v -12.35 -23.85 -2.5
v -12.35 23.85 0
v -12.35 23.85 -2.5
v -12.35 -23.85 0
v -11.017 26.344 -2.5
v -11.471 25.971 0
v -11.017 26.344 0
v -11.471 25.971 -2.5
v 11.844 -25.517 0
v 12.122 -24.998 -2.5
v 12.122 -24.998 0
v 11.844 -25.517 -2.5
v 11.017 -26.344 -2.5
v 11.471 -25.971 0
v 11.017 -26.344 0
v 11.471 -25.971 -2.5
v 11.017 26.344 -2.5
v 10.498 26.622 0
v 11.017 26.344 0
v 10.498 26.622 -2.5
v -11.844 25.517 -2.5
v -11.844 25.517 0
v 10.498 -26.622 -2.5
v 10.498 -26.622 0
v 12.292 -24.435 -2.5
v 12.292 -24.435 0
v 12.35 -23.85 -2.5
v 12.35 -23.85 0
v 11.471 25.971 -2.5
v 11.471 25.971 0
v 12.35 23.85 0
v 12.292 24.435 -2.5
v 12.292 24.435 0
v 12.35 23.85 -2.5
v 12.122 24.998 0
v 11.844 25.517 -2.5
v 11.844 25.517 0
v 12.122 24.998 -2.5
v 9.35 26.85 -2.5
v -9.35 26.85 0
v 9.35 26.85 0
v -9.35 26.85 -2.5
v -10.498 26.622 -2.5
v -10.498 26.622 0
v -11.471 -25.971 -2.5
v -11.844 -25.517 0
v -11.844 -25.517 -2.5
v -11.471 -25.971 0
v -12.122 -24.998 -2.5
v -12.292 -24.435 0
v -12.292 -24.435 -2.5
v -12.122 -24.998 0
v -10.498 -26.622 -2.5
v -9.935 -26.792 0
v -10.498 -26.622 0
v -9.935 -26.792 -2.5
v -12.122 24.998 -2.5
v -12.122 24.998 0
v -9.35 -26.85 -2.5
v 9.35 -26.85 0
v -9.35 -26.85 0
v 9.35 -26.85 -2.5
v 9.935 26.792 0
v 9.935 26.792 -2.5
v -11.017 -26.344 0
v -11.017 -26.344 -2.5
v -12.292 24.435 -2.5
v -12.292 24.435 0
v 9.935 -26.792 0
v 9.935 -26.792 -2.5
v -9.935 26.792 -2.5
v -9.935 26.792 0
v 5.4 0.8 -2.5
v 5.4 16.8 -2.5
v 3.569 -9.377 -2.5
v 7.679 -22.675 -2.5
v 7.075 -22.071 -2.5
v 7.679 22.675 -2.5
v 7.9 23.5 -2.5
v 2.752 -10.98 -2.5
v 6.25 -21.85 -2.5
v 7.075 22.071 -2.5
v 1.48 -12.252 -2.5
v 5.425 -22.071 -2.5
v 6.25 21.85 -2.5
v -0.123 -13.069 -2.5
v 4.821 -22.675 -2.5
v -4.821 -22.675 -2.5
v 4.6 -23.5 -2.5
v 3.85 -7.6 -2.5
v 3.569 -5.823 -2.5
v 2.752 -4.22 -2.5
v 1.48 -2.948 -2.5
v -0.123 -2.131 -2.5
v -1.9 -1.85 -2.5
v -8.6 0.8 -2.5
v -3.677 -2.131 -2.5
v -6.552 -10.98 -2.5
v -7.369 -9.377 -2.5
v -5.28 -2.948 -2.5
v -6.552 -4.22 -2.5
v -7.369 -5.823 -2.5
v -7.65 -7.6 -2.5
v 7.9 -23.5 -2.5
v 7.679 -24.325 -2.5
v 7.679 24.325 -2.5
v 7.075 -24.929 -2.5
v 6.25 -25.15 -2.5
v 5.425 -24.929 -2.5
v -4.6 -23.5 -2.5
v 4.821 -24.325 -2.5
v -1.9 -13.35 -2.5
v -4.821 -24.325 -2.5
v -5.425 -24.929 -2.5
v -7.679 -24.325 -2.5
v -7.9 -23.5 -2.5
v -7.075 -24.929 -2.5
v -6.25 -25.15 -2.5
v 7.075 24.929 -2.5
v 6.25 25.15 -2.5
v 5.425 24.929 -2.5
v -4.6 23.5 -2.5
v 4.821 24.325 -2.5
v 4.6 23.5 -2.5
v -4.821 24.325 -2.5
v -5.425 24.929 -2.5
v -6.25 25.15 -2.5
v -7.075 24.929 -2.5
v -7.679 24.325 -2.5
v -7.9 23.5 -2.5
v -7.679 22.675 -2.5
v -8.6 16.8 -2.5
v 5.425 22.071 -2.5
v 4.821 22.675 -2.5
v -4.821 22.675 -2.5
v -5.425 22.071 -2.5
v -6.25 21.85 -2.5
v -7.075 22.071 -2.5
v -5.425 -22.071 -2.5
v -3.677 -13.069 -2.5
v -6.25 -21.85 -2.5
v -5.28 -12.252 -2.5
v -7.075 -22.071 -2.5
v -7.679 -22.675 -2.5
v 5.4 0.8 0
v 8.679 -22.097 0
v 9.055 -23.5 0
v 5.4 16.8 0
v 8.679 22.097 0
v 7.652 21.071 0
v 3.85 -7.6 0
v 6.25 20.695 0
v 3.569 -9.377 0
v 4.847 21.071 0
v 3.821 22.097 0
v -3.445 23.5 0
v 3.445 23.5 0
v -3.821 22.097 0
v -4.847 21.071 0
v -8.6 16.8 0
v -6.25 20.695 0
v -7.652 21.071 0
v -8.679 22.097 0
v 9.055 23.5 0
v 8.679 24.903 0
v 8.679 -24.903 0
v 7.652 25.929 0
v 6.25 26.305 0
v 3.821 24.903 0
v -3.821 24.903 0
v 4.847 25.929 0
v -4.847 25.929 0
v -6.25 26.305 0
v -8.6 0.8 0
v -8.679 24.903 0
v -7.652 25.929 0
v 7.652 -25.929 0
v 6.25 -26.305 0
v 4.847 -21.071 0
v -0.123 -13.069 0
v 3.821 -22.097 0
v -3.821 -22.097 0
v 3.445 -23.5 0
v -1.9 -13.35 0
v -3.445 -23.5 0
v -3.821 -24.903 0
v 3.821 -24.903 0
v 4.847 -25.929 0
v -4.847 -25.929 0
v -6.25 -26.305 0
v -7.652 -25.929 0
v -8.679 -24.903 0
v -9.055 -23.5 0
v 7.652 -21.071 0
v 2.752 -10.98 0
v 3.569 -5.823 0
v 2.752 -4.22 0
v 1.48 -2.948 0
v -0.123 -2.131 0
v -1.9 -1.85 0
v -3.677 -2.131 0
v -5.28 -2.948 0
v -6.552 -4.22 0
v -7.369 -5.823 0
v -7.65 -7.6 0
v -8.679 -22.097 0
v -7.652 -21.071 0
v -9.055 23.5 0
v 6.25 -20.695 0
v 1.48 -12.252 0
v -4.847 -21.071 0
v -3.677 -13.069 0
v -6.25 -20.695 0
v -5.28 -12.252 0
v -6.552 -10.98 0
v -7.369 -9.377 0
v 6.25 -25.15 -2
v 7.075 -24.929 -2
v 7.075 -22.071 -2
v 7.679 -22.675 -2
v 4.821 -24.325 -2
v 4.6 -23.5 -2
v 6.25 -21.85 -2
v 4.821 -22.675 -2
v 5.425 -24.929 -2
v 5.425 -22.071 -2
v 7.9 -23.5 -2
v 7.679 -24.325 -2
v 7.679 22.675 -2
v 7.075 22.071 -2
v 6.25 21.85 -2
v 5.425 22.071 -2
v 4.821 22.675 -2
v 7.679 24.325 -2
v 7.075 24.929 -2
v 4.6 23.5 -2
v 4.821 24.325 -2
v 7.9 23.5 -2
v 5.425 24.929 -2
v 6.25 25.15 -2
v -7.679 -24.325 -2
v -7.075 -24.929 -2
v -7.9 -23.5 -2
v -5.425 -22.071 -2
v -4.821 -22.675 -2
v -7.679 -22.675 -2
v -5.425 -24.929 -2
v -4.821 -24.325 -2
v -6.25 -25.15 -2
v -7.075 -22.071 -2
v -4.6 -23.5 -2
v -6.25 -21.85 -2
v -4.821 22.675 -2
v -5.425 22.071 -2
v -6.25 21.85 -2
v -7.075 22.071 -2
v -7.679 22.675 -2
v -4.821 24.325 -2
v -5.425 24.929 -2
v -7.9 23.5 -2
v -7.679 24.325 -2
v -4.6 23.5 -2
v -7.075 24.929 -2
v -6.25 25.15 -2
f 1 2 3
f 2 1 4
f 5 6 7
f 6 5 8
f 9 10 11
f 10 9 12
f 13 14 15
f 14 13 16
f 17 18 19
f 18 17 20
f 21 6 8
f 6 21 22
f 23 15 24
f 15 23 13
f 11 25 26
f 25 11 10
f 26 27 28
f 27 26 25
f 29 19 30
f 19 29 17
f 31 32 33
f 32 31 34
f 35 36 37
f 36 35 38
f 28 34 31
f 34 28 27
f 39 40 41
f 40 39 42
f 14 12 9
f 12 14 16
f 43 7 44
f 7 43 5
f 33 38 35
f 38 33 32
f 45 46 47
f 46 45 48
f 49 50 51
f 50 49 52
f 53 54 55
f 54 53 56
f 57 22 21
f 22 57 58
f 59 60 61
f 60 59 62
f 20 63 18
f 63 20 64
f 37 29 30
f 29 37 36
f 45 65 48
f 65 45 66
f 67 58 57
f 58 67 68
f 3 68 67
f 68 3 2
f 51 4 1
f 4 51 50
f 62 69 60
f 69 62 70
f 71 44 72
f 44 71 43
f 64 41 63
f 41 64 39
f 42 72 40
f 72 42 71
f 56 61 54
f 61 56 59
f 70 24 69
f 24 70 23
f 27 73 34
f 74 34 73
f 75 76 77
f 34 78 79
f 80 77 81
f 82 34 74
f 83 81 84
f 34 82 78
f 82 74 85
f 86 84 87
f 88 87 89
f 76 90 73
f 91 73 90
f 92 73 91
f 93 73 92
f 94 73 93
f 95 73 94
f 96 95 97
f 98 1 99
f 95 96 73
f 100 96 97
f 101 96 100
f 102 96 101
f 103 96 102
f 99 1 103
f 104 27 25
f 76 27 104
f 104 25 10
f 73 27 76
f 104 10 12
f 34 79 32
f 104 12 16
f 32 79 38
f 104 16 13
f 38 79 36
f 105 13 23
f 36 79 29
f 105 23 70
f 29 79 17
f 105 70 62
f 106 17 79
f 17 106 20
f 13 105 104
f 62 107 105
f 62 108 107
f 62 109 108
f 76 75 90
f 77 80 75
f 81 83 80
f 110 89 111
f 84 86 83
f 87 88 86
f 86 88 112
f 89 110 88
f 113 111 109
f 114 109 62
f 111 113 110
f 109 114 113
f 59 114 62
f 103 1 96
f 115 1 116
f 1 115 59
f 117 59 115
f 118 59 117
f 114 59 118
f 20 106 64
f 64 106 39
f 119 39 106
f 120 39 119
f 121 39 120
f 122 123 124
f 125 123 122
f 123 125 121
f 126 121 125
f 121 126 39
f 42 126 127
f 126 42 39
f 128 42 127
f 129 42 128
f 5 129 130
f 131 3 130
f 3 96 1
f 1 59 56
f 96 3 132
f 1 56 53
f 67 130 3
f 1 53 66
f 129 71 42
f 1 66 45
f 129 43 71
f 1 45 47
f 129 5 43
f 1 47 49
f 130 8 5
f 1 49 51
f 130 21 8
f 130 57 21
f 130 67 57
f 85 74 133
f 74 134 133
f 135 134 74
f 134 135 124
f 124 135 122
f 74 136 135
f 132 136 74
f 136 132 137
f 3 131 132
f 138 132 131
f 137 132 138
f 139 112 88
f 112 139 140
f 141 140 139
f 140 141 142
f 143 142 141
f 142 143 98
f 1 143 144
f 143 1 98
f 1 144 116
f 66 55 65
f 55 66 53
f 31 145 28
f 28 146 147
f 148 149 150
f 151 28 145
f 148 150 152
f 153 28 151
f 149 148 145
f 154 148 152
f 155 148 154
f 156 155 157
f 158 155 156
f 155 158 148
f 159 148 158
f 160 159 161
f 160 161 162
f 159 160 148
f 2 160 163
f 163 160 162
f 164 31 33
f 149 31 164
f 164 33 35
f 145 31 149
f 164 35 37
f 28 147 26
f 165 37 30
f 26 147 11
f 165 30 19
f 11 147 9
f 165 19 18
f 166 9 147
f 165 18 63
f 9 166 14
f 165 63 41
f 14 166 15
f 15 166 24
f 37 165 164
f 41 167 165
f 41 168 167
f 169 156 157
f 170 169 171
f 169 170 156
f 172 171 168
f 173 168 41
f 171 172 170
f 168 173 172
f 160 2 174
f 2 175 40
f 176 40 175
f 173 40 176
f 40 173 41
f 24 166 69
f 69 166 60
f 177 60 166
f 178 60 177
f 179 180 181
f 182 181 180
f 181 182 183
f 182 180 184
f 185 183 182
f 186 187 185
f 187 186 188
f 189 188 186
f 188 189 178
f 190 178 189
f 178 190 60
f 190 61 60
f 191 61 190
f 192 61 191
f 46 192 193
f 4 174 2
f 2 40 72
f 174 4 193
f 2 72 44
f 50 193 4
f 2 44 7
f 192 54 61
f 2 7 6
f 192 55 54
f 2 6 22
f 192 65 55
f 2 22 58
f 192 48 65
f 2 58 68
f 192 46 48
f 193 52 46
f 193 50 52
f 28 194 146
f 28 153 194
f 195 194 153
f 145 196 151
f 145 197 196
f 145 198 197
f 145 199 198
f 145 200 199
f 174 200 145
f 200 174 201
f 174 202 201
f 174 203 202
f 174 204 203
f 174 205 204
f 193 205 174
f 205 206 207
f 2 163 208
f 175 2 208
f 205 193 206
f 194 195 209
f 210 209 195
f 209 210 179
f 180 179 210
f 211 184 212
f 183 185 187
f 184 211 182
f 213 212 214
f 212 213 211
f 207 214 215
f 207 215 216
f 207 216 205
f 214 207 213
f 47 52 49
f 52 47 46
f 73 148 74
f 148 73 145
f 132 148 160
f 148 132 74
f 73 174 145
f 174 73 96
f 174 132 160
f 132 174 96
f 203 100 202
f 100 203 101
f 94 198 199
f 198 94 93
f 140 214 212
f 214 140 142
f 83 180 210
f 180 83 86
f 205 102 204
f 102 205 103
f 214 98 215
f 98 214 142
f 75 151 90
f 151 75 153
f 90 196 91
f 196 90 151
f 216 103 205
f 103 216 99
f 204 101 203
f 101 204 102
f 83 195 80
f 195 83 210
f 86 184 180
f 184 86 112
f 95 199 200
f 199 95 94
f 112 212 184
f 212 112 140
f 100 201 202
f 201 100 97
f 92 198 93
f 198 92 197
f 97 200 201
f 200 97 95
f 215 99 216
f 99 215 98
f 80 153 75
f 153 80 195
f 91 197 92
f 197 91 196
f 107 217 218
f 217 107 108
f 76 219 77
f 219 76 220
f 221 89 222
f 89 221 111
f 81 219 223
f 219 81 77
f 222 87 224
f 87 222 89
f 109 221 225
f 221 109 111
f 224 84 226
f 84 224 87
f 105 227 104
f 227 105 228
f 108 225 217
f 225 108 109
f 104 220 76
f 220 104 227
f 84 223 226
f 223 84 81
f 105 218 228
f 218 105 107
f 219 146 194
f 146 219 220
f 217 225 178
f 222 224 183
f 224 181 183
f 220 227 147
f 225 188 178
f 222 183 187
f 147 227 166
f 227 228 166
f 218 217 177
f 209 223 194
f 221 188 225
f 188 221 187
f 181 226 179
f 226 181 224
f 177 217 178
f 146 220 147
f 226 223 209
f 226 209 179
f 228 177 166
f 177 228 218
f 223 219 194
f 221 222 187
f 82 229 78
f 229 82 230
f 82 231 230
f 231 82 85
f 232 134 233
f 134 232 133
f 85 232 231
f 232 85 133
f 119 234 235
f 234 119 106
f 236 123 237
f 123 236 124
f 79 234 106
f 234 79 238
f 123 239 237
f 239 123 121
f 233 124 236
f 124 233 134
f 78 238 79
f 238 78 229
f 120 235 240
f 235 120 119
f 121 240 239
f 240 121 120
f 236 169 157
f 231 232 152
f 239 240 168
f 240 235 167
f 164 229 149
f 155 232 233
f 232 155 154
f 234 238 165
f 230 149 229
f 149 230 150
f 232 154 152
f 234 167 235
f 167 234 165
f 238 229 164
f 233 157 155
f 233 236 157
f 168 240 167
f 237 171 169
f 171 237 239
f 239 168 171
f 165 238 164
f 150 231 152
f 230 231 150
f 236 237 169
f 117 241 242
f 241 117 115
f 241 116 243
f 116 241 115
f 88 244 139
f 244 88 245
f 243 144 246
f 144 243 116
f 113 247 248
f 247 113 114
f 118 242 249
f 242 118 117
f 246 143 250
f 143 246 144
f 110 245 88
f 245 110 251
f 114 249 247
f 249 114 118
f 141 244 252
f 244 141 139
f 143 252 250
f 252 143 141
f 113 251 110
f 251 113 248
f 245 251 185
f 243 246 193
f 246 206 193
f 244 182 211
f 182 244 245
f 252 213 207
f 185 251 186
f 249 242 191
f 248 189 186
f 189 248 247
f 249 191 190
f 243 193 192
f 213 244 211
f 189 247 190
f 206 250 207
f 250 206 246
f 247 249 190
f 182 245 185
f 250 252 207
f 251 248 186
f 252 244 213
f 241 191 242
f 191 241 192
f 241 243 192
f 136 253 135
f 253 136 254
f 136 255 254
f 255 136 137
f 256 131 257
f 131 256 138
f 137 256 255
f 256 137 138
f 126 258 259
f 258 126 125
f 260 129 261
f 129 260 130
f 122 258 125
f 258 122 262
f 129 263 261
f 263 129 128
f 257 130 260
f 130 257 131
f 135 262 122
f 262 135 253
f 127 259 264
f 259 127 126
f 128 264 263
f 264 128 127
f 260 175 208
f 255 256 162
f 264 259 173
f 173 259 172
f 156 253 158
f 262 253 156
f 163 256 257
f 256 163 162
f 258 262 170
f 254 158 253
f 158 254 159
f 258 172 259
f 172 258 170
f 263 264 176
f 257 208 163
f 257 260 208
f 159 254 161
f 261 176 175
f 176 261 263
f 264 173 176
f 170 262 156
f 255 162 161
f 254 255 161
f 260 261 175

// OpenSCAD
// file: parameter.scad
nStrings=6;
nFrets=24;
nLedFrets=16;
m5Dia=5.3;
m5HeadZ=3.5;
m4Dia=4.3;
m4NutDia=8.3;
m4NutZ=3.5;
m4HeadZ=2.5;
m3Dia=3.3;
m3NutDia=6.6;
m3NutZ=2.5;
m3HeadZ=2;
strDistN=7;
strDistB=10.25;
scale=645;
neckSlotY=500;

slotXY=15;

bodySlotX=115;
bodySlotY=250;

jackYA=40;
jackYB=54;
jackZA=20;
jackZB=25;

bodyX=300;

bodyZ=40;

strDia=[1.7,1.4,1.1,0.7,0.5,0.35];

fretStrPlus=4;
fretLN=strDistN*(nStrings-1)+fretStrPlus*2;
fretLB=strDistB*(nStrings-1)+fretStrPlus*2;
strSpanB=strDistB*(nStrings-1);
strSpanN=strDistN*(nStrings-1);
fretBtmZ=1;
neckSlotX=fretLN;
neckSlotDist=neckSlotX-slotXY*2;

neck_sideT=5.5; //thicknes of the neck side locks
neck_bottomT=2.5;

neck_mntPosYA=447;
neck_mntPosYB=420;
neck_mntEndT=2.5;
neck_lastFretSpc=13;

nut_slotSink=6;

//fretY=16;
fretPcbZ=1.6;
fretDia=3.5;
fretZ=1.5;
fretOvrZ=4;
fretboardZ=fretOvrZ+fretPcbZ;



L=scale;
k=1.05946;

fretPos1=scale-(scale/pow(k,4));

function fretPos(i)=L-(L/pow(k,i));
function fretSpc(i)=(L/pow(k,i))-(L/pow(k,i+1));
function strSpc(i)=i/L*strDistB+(1-i/L)*strDistN;
function fretL(i)=(i/L*strDistB+(1-i/L)*strDistN)*(nStrings-1)+fretStrPlus*2;

echo (70-(fretL(fretPos(1))));
// main file
include <parameter.scad>




module mount(){
y=20;
z=jackZB/2+m3Dia*2;
x=m3Dia*2;
t=0.4;
$fn=16;

difference(){
cube([x,y,z]);
translate([x/2,m3Dia,0])cylinder(d=m3Dia,h=z);
translate([x/2,m3Dia*2,m3Dia/2])rotate([-90,0,0])cylinder(d=m3Dia-t,h=z);
translate([x/2,m3Dia*2,m3Dia/2+jackZB/2])rotate([-90,0,0])cylinder(d=m3Dia-t,h=z);
}
}

module plate(){
height=5;
x=2.5;
rj45Y=16;
rj45Z=14;
rj45YPos=11.2;

jDia=11.5;
jrDist=16.6;
jYPos=12.4;
jZPos=8.1;
pcbY=jackYA;
pcbZ=1.4;

$fn=32;
t=0.3;

difference(){
//translate([15,(jackYB-jackYA)/2,-jackZA/2])cube([neckSlotX,jackYA,jackZA]);
//translate([-9,-2.5,0])cube([neckSlotX,55,slotXY+1]);
translate([0,0,0])rotate([0,90,0])rcube([jackZB-t,jackYB-t,x],3);
translate([0,pcbY/2-rj45YPos,-jackZA/2+pcbZ])rcube([x*3,rj45Y,rj45Z],1);
translate([-1,-pcbY/2+jYPos,-jackZA/2+jZPos])rotate([0,90,0])cylinder(d=jDia,h=20,$fn=20);

translate([-1,-jackYB/2+(jackYB-jackYA)/4,jackZB/4])rotate([0,90,0])cylinder(d=m3Dia,h=20,$fn=12);
translate([0,-jackYB/2+(jackYB-jackYA)/4,jackZB/4])rotate([0,90,0])cylinder(d2=m3Dia,d1=m3Dia*1.7,h=m3HeadZ,$fn=12);

translate([-1,jackYB/2-(jackYB-jackYA)/4,jackZB/4])rotate([0,90,0])cylinder(d=m3Dia,h=20,$fn=12);
translate([0,jackYB/2-(jackYB-jackYA)/4,jackZB/4])rotate([0,90,0])cylinder(d2=m3Dia,d1=m3Dia*1.7,h=m3HeadZ,$fn=12);

translate([-1,-jackYB/2+(jackYB-jackYA)/4,-jackZB/4])rotate([0,90,0])cylinder(d=m3Dia,h=20,$fn=12);
translate([0,-jackYB/2+(jackYB-jackYA)/4,-jackZB/4])rotate([0,90,0])cylinder(d2=m3Dia,d1=m3Dia*1.7,h=m3HeadZ,$fn=12);

translate([-1,jackYB/2-(jackYB-jackYA)/4,-jackZB/4])rotate([0,90,0])cylinder(d=m3Dia,h=20,$fn=12);
translate([0,jackYB/2-(jackYB-jackYA)/4,-jackZB/4])rotate([0,90,0])cylinder(d2=m3Dia,d1=m3Dia*1.7,h=m3HeadZ,$fn=12);
}
}

rotate([0,90,0])plate();


module rcube(size,radius){
$fn=32;
linear_extrude(height=size[2])
hull()
{
    // place 4 circles in the corners, with the given radius
    translate([(-size[0]/2)+(radius), (-size[1]/2)+(radius), 0])
    circle(r=radius);

    translate([(size[0]/2)-(radius), (-size[1]/2)+(radius), 0])
    circle(r=radius);

    translate([(-size[0]/2)+(radius), (size[1]/2)-(radius), 0])
    circle(r=radius);

    translate([(size[0]/2)-(radius), (size[1]/2)-(radius), 0])
    circle(r=radius);
}
}
